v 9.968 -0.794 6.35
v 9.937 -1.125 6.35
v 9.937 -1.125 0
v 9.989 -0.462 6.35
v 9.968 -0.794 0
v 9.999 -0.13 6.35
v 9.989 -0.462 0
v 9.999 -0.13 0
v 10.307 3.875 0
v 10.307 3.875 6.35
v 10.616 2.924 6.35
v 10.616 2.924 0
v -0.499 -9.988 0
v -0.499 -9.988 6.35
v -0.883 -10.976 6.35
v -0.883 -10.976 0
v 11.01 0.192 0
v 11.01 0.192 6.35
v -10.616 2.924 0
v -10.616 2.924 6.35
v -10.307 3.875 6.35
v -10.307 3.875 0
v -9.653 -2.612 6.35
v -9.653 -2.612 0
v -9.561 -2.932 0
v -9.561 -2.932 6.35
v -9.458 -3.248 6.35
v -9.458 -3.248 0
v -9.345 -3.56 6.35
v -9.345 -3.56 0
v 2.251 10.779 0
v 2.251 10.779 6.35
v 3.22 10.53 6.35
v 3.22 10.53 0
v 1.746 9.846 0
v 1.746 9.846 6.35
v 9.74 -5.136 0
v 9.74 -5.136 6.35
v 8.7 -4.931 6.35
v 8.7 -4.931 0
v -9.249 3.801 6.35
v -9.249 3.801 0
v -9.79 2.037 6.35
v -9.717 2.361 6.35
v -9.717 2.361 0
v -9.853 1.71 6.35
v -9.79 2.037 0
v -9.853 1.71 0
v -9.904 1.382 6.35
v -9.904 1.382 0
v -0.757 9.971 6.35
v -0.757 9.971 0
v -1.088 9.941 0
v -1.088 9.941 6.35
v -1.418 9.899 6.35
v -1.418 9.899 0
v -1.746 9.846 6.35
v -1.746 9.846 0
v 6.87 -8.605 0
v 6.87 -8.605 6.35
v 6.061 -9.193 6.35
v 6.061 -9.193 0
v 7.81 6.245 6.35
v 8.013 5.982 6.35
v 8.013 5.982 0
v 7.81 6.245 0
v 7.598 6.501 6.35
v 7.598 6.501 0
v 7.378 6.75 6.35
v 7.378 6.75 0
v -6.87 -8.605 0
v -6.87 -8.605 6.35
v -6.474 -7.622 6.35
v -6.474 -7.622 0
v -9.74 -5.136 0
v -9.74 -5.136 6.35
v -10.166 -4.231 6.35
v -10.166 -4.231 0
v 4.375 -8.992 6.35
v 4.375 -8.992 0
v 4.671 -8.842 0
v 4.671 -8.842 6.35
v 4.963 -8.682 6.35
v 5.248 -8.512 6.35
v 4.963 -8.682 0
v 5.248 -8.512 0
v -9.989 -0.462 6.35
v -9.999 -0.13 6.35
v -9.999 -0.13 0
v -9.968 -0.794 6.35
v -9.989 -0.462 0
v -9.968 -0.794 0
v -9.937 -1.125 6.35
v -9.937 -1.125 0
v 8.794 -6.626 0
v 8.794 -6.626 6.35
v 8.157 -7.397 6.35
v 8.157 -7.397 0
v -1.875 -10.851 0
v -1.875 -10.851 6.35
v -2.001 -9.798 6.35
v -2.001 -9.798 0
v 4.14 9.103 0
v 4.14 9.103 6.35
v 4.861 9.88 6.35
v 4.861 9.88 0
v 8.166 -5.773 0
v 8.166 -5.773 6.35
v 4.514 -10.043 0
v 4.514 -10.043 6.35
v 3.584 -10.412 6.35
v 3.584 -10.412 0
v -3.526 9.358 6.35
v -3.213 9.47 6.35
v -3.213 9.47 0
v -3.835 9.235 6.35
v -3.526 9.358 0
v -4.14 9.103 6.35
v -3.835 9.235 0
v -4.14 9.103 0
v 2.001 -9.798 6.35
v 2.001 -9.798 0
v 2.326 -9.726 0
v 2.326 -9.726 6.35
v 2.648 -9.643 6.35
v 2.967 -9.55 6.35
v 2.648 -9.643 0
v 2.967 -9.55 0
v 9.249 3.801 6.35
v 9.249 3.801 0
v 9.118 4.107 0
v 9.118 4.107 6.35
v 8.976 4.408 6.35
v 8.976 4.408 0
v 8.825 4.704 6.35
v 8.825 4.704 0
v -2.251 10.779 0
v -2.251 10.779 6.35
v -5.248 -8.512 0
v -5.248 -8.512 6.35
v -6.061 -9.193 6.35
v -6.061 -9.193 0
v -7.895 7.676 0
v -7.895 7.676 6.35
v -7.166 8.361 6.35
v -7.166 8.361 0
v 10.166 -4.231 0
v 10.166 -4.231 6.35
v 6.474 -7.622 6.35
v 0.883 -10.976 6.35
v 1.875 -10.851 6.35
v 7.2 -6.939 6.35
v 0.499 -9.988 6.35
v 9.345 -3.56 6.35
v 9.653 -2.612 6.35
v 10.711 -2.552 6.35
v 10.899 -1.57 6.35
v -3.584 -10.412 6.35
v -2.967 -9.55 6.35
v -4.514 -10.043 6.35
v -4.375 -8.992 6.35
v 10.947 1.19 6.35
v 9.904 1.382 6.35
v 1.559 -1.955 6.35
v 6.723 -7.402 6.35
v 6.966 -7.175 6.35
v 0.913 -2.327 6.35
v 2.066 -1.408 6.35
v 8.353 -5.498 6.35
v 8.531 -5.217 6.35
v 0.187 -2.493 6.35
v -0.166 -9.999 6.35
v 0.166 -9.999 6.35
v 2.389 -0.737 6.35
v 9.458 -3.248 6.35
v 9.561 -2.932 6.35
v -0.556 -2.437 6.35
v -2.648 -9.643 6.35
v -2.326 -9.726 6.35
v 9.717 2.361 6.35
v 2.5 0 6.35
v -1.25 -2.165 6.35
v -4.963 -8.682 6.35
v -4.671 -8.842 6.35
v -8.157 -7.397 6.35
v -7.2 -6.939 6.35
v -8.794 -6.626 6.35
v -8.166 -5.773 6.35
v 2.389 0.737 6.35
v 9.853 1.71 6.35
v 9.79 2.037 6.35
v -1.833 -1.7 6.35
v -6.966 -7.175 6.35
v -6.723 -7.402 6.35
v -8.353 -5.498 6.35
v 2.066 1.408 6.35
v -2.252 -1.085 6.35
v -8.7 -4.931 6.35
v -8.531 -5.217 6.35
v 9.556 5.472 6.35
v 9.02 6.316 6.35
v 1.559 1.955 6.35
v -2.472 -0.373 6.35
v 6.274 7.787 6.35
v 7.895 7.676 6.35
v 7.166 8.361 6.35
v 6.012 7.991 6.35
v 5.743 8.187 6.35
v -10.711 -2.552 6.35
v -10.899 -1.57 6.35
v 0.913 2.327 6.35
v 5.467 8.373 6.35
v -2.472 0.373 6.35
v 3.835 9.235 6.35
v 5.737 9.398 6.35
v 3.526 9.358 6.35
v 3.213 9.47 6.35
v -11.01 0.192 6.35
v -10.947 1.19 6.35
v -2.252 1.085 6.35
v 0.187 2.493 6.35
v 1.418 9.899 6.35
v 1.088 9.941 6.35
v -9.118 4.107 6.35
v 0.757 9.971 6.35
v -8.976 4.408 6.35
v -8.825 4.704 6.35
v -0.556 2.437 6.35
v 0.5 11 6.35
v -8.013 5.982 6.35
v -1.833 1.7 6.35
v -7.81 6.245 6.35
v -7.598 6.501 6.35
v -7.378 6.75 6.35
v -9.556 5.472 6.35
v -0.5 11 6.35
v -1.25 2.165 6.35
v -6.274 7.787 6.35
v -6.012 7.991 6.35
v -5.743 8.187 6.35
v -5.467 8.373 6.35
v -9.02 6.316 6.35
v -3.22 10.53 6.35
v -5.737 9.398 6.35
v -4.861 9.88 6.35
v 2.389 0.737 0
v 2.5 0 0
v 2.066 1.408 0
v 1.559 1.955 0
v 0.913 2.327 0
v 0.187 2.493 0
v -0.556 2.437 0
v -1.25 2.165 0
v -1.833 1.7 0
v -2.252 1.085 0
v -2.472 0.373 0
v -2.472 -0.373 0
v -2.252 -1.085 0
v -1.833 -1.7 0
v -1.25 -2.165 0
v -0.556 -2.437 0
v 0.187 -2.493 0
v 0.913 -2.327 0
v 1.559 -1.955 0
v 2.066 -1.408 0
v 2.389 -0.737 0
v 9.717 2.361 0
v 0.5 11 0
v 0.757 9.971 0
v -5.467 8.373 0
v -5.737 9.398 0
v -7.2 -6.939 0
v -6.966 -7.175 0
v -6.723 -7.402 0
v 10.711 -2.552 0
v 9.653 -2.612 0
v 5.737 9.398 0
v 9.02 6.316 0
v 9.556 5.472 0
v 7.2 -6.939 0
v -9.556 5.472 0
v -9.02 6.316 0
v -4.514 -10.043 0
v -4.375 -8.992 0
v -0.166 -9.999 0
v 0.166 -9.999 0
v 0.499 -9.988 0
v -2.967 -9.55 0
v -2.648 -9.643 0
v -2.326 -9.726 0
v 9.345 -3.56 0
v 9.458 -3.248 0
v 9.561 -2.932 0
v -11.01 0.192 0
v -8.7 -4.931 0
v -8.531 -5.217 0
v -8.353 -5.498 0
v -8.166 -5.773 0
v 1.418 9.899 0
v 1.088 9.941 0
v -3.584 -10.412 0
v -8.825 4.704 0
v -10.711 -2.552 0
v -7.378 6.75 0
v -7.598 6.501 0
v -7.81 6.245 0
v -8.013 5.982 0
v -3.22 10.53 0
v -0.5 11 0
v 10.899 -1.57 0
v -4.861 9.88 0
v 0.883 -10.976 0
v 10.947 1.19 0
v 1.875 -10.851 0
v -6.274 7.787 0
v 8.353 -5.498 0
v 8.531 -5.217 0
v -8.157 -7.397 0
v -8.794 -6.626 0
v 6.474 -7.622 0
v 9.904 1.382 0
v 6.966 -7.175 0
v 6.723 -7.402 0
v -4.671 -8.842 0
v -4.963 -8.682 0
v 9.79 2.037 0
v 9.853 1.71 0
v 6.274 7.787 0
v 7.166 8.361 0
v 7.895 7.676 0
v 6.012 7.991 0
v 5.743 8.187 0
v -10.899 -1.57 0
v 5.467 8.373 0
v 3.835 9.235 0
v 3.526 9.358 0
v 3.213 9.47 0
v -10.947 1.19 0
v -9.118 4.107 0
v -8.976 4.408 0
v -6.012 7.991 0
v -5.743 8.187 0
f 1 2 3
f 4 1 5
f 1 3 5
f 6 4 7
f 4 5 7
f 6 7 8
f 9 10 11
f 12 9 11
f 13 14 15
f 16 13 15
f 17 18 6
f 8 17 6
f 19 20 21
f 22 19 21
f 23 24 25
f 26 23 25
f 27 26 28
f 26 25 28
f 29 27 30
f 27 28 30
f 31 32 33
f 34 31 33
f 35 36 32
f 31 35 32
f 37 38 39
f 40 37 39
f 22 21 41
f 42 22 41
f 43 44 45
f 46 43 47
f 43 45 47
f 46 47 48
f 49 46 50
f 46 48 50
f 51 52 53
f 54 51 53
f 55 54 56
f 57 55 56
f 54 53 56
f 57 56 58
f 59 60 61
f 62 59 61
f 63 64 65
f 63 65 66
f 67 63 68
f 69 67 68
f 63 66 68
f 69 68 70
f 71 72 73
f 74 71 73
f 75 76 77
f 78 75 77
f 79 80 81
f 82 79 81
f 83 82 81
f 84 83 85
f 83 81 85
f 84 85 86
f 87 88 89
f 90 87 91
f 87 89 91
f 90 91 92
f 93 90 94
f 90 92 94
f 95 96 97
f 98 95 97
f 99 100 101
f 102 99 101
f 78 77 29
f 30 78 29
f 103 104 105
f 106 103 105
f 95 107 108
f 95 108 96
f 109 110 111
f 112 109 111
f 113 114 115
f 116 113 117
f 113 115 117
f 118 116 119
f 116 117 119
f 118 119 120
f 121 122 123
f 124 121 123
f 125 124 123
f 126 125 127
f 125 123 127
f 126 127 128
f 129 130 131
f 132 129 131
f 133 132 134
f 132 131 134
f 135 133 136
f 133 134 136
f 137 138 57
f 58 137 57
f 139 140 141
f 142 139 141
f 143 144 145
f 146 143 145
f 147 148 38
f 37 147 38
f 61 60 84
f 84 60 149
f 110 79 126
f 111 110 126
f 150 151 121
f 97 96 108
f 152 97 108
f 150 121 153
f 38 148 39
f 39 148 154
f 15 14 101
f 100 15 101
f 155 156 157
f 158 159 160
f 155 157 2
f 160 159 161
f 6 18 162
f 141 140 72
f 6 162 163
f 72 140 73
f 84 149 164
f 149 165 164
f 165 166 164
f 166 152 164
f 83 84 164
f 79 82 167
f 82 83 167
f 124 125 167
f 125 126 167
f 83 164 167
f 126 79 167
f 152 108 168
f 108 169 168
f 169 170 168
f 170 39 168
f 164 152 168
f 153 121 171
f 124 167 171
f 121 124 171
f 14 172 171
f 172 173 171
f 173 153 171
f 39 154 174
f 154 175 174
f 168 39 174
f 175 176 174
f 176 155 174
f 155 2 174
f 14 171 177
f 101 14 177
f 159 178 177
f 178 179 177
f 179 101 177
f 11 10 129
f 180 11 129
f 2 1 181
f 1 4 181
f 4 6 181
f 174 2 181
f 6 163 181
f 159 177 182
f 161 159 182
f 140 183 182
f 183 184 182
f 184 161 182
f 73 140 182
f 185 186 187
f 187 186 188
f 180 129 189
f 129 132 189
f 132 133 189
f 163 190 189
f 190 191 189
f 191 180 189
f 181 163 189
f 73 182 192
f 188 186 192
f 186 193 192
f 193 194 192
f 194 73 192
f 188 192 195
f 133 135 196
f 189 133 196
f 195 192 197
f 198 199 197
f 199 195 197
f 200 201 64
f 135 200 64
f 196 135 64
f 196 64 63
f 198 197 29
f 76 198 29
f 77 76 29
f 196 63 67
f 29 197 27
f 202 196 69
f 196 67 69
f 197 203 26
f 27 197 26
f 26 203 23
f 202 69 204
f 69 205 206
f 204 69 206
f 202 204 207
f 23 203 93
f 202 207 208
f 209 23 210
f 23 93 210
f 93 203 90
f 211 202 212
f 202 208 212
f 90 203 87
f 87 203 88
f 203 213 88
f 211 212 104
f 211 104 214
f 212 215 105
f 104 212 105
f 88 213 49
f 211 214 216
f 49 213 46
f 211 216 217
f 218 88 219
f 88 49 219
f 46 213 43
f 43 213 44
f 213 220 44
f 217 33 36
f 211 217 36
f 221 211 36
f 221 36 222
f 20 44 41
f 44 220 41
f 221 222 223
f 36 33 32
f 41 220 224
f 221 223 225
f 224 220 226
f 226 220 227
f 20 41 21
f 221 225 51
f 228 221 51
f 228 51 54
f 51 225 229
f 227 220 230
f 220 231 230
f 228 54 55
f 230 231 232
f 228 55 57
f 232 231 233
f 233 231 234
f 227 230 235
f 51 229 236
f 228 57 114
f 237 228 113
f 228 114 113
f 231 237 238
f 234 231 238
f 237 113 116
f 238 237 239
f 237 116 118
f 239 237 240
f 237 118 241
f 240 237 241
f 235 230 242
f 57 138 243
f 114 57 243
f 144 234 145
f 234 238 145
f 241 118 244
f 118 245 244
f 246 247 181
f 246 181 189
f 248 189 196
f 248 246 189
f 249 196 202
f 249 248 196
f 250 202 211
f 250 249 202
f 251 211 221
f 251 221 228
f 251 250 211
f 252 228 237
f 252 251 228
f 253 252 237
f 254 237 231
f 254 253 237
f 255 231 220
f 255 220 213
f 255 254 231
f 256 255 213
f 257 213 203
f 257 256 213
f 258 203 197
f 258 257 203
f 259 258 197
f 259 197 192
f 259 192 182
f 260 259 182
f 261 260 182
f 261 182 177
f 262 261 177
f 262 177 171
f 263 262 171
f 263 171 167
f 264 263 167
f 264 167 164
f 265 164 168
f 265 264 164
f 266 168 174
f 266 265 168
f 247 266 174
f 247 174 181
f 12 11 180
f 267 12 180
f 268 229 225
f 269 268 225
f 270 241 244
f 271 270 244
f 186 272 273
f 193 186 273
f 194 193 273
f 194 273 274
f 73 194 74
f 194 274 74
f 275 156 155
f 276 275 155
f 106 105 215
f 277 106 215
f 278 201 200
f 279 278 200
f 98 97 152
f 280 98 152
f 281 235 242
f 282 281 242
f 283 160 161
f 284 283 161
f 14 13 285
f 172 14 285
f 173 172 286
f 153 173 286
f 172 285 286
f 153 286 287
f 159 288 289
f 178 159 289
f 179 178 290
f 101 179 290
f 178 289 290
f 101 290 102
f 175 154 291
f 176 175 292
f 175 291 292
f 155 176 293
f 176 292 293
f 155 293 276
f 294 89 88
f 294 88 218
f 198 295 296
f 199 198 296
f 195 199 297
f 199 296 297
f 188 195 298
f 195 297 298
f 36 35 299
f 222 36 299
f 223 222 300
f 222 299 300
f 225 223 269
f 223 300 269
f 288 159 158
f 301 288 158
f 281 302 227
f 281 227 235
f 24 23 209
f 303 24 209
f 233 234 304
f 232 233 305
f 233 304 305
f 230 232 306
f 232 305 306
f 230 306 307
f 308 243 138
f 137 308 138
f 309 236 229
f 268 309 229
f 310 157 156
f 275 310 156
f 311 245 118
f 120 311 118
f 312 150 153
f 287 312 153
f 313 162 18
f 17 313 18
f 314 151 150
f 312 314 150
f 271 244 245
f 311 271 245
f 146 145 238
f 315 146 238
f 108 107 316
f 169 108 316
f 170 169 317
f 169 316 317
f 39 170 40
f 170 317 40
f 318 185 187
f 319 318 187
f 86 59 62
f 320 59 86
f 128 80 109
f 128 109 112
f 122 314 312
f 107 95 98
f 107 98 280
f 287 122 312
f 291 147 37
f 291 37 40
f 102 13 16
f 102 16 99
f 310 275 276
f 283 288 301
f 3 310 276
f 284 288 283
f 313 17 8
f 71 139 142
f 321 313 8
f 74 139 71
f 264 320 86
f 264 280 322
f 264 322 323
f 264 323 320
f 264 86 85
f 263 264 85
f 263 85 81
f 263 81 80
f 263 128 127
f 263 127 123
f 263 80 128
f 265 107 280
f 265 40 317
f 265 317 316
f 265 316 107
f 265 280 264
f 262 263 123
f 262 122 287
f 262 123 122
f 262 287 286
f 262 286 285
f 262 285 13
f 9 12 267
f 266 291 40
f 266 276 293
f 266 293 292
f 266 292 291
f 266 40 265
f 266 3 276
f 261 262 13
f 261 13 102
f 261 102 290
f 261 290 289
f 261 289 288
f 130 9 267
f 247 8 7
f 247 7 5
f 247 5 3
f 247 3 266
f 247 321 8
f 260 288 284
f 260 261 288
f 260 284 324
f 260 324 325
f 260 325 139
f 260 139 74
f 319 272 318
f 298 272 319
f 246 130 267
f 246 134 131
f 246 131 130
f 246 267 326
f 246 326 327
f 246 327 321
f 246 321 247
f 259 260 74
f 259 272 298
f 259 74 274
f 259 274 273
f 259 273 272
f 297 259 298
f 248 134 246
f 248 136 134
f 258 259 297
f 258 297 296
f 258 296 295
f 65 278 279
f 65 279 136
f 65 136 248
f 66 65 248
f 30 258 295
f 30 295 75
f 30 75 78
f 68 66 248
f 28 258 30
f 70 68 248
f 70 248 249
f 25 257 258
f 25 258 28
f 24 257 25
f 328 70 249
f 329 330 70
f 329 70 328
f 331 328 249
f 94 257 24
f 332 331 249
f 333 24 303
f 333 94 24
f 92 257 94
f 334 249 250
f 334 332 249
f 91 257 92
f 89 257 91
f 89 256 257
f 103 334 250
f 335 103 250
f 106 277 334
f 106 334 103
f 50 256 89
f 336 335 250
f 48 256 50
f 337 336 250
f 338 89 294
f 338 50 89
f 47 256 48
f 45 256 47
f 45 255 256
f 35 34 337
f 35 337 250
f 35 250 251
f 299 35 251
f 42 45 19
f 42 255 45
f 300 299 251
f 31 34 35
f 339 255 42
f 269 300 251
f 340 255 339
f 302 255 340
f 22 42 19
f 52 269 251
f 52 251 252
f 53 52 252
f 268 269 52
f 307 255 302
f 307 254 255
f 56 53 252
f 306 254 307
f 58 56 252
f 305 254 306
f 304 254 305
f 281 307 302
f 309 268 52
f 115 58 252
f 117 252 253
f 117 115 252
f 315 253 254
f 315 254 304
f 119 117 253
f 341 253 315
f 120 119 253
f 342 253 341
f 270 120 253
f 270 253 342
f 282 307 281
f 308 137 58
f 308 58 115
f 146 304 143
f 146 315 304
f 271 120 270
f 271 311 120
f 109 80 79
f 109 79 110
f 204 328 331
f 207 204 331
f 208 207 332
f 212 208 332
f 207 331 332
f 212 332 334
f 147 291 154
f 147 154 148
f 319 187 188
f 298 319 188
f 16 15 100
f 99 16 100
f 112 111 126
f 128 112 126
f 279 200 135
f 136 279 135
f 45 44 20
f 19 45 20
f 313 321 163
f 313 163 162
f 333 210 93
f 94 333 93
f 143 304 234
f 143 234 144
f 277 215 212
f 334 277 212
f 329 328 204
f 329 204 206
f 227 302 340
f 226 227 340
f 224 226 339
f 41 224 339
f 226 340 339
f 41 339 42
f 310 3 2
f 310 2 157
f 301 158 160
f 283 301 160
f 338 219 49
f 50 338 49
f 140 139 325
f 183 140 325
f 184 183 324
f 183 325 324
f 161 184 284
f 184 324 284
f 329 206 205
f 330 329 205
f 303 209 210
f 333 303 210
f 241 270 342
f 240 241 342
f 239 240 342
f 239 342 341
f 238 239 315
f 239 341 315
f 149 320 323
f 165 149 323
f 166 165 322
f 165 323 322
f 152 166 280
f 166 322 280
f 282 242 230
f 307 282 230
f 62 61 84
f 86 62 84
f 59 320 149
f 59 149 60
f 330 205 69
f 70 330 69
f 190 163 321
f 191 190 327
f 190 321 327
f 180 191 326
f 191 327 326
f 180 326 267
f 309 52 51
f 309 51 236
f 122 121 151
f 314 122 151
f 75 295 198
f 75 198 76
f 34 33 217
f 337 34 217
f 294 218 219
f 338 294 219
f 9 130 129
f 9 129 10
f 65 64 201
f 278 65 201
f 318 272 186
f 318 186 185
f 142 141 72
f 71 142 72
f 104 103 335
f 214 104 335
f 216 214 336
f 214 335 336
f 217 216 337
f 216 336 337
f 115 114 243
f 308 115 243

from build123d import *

# Parameters (mm, degrees)
SKETCH1_R           = 10
SKETCH1_R_2         = 2.5
BOSS_EXTRUDE1_DEPTH = 6.35
BOSS_EXTRUDE2_DEPTH = 6.35
CIRPATTERN1_COUNT   = 25


with BuildPart() as part:
    # Sketch1 → Boss-Extrude1 (new body)
    with BuildSketch(Plane.XY):
        Circle(SKETCH1_R)
        Circle(SKETCH1_R_2, mode=Mode.SUBTRACT)
    extrude(amount=BOSS_EXTRUDE1_DEPTH)

    # Sketch2 → Boss-Extrude2 (add)
    with BuildSketch(Plane.XY.offset(6.35)):
        Polygon((-0.5, 11), (0.5, 11), (1, 9), (-1, 9), align=None)
    boss_extrude2 = extrude(amount=-BOSS_EXTRUDE2_DEPTH)

    # CirPattern1: Boss-Extrude2 ×25 about axis
    cirpattern1_axis = Axis((0, 0, 0), (0, 0, 1))
    for i in range(1, CIRPATTERN1_COUNT):
        add(boss_extrude2.rotate(cirpattern1_axis, i * 360 / CIRPATTERN1_COUNT))


solid = part.part
